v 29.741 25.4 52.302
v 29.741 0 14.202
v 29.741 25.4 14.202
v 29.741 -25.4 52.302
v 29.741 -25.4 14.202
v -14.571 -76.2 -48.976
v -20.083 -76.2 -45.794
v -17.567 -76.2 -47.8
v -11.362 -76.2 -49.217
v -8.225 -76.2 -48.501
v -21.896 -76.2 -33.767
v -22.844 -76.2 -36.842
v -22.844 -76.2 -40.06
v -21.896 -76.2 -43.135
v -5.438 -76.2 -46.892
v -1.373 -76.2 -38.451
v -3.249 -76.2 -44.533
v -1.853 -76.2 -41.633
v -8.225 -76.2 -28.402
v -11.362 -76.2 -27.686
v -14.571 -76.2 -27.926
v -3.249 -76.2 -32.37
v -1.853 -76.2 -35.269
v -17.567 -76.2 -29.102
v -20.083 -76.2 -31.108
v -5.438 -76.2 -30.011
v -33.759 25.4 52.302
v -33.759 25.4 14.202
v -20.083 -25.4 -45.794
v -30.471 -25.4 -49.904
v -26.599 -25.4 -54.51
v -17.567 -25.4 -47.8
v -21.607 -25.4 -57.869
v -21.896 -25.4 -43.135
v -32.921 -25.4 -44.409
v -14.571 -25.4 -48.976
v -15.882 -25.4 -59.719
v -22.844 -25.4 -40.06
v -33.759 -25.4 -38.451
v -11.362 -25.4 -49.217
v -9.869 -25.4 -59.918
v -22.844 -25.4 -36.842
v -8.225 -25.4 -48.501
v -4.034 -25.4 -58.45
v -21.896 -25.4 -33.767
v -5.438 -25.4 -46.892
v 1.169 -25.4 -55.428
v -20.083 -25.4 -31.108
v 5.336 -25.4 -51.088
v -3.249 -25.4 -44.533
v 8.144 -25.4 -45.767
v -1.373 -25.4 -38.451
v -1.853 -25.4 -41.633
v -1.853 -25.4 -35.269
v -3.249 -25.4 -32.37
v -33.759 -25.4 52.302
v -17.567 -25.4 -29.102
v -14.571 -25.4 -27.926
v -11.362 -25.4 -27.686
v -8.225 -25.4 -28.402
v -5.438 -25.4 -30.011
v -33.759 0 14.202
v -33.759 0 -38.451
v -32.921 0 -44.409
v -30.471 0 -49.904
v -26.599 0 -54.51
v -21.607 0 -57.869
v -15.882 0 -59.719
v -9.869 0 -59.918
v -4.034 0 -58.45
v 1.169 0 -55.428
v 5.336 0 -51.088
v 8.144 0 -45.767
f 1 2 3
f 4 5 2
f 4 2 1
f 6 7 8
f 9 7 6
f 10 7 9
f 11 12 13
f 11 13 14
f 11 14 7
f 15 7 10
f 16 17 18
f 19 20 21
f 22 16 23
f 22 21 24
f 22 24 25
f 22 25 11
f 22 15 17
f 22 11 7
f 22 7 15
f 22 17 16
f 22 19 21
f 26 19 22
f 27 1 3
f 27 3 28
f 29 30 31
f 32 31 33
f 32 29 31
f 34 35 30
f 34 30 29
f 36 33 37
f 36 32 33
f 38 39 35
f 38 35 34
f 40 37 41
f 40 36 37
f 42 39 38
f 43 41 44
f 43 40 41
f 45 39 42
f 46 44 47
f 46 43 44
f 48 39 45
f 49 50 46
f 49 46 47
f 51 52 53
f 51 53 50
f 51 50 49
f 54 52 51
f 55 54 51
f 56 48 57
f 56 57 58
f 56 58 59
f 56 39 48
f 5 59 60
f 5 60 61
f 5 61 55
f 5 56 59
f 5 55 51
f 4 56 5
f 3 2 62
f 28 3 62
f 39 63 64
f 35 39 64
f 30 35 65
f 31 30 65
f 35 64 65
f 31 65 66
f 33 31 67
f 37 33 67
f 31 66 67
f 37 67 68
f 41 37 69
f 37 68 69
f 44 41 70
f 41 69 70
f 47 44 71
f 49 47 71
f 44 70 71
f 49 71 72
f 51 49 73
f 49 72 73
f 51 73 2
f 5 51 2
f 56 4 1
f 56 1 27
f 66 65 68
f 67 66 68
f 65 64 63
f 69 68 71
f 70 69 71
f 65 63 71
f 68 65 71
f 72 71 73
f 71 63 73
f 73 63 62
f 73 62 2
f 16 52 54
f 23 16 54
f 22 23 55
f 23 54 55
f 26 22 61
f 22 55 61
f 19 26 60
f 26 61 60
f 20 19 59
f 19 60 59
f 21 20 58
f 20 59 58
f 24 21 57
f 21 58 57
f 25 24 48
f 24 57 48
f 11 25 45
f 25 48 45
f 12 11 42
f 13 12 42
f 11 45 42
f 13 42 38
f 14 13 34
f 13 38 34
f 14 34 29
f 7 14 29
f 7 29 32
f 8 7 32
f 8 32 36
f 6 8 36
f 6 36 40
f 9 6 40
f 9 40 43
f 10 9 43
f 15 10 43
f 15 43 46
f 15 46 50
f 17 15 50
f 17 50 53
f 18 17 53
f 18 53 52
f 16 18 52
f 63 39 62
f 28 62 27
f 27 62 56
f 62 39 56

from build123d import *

# Parameters (mm, degrees)
F0_W     = 63.5
F0_H     = 38.1
F1_DEPTH = 25.4
F2_R     = 10.795746
F3_DEPTH = 76.2
F4_W     = 63.5
F4_H     = 38.1
F5_DEPTH = 25.4


with BuildPart() as f1:
    # F0 (on Front) → F1 (new body)
    with BuildSketch(Plane.XZ):
        with Locations((-2.008985, 33.25243)):
            Rectangle(F0_W, F0_H)
        with BuildLine():
            Line((29.741015, 14.20243), (-33.758985, 14.20243))
            Line((-33.758985, 14.20243), (-33.758985, -38.45109))
            ThreePointArc((-33.758985, -38.45109), (-12.168985, -16.86109), (9.421015, -38.45109))
            ThreePointArc((9.421015, -38.45109), (9.099334, -42.164136), (8.143877, -45.766536))
            Line((8.143877, -45.766536), (29.741015, 14.20243))
        make_face()
        with BuildLine():
            ThreePointArc((9.421015, -38.45109), (-12.168985, -16.86109), (-33.758985, -38.45109))
            ThreePointArc((-33.758985, -38.45109), (-15.88203, -59.71941), (8.143877, -45.766536))
            ThreePointArc((8.143877, -45.766536), (9.099334, -42.164136), (9.421015, -38.45109))
        make_face()
    extrude(amount=F1_DEPTH)

    # F2 (on Front) → F3 (join)
    with BuildSketch(Plane.XZ):
        with Locations((-12.168985, -38.45109)):
            Circle(F2_R)
    extrude(amount=F3_DEPTH)

    # F4 (on face) → F5 (join)
    with BuildSketch(Plane(origin=(0, 0, 0), x_dir=(-1, 0, 0), z_dir=(0, 1, 0))):
        with Locations((2.008985, 33.25243)):
            Rectangle(F4_W, F4_H)
    extrude(amount=F5_DEPTH)


solid = f1.part
